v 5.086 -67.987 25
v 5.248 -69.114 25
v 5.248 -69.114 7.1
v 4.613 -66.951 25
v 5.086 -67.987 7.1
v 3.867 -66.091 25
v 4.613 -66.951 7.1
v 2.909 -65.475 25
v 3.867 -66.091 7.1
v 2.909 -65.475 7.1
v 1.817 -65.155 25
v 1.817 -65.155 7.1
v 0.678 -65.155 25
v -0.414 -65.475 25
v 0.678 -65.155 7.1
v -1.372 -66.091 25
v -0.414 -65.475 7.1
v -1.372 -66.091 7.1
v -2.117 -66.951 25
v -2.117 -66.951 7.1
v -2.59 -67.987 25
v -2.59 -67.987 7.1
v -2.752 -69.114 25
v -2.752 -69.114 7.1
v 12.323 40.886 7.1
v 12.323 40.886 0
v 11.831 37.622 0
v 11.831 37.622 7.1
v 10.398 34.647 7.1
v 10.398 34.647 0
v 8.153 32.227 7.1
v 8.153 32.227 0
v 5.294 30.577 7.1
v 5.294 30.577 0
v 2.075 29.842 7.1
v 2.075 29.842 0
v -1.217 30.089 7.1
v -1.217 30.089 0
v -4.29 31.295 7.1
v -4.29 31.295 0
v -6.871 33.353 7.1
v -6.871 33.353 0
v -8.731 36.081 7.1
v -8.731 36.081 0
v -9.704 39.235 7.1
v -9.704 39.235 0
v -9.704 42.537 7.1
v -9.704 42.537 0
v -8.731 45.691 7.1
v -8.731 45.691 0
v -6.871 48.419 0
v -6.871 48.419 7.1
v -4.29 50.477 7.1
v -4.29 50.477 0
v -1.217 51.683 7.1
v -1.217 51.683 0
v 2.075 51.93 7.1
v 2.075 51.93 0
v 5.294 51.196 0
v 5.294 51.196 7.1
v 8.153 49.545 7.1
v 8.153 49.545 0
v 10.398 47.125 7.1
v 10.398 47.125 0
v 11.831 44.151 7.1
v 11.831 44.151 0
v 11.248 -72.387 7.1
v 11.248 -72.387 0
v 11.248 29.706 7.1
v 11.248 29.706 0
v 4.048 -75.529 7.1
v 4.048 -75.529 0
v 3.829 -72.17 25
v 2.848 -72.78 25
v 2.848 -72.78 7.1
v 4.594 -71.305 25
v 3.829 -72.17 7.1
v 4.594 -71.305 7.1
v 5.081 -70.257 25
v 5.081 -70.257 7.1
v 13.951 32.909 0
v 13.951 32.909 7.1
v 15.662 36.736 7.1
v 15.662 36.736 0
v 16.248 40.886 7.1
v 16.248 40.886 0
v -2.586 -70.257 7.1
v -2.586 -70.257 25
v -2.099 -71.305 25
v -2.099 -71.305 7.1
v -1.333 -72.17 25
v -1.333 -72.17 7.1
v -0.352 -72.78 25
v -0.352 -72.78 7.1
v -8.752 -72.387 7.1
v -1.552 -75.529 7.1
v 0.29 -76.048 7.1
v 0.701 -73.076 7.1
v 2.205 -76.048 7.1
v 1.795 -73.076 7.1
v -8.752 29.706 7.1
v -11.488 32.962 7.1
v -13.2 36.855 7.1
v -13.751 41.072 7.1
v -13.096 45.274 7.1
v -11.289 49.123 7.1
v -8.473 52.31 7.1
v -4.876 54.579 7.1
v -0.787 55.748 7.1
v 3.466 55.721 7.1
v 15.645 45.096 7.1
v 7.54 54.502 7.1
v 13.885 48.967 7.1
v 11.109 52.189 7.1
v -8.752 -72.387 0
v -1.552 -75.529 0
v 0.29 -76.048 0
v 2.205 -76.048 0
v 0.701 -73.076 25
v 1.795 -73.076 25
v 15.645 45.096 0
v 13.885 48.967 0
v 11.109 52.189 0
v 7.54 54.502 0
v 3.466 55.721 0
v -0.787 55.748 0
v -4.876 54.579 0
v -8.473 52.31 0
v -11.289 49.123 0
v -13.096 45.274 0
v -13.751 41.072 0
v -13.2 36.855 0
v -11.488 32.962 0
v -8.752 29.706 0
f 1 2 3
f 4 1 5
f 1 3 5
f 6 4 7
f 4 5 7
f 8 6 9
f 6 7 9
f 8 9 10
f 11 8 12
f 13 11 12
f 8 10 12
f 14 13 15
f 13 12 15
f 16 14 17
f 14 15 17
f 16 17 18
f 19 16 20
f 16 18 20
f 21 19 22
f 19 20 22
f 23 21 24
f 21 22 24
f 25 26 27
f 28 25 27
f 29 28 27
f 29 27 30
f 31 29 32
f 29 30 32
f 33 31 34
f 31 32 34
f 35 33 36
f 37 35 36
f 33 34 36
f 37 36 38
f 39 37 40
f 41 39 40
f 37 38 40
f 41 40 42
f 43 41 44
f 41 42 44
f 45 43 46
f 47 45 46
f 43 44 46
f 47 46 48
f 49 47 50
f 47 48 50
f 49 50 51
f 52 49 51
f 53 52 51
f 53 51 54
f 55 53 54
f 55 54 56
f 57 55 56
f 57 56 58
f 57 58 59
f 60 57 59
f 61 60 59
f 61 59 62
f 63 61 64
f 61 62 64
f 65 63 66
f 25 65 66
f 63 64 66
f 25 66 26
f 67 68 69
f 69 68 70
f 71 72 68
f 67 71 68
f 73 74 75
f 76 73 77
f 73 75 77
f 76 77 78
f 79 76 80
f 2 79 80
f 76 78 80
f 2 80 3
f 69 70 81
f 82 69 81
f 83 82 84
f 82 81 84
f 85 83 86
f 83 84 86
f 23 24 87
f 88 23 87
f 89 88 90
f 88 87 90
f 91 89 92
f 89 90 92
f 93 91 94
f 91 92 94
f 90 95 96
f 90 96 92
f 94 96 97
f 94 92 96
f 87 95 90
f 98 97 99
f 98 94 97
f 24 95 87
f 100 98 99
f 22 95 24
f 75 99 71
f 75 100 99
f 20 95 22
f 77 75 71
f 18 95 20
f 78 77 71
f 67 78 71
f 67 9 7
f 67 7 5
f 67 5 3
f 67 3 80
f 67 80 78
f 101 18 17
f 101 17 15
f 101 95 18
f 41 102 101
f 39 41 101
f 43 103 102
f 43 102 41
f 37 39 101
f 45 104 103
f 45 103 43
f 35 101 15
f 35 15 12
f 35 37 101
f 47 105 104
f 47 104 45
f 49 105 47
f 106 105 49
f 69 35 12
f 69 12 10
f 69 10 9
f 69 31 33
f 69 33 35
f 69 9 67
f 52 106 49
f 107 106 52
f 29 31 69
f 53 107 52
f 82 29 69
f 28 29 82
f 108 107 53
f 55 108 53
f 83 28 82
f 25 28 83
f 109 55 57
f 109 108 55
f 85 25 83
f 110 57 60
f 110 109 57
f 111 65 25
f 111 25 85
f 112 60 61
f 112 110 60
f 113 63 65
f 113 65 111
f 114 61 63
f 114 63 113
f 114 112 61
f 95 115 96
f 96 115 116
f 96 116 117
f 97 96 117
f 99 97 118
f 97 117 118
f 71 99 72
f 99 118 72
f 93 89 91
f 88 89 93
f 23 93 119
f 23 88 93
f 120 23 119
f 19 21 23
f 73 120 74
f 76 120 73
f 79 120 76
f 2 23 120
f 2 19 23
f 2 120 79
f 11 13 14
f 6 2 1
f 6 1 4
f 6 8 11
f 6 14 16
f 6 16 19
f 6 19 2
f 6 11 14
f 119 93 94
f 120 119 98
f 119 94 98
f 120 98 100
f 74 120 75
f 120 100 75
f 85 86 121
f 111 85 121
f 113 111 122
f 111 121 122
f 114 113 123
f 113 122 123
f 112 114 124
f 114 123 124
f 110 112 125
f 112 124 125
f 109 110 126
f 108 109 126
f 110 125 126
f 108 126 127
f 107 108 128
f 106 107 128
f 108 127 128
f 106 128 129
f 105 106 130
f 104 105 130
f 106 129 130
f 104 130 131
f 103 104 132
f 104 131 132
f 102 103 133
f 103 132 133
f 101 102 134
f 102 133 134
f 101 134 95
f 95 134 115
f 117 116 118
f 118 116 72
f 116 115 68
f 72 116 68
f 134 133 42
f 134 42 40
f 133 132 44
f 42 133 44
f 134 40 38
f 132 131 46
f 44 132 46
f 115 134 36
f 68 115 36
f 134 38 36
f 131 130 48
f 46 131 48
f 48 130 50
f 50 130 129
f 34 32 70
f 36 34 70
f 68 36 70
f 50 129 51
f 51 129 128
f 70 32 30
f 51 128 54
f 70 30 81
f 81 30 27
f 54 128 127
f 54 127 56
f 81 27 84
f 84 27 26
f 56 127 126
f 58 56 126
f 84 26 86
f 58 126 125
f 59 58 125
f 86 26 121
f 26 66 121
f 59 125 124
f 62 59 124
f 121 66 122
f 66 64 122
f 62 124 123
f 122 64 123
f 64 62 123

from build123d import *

# Parameters (mm, degrees)
F1_DEPTH = 7.1
F2_DEPTH = 25


with BuildPart() as f1:
    # F0 (on Top) → F1 (new body)
    with BuildSketch(Plane.XY):
        with BuildLine():
            Line((-2.752413094, -69.1138580441), (1.247586906, -69.1138580441))
            Line((1.247586906, -69.1138580441), (5.247586906, -69.1138580441))
            ThreePointArc((5.247586906, -69.1138580441), (1.247586906, -65.1138580441), (-2.752413094, -69.1138580441))
        make_face()
        with BuildLine():
            Line((5.247586906, -69.1138580441), (1.247586906, -69.1138580441))
            Line((1.247586906, -69.1138580441), (-2.752413094, -69.1138580441))
            ThreePointArc((-2.752413094, -69.1138580441), (-2.0990532002, -71.3047482742), (-0.352413094, -72.7799186001))
            ThreePointArc((-0.352413094, -72.7799186001), (1.247586906, -73.1138580441), (2.847586906, -72.7799186001))
            ThreePointArc((2.847586906, -72.7799186001), (4.5942270121, -71.3047482742), (5.247586906, -69.1138580441))
        make_face()
        with BuildLine():
            ThreePointArc((-2.752413094, -69.1138580441), (1.247586906, -65.1138580441), (5.247586906, -69.1138580441))
            Line((5.247586906, -69.1138580441), (8.247586906, -69.1138580441))
            ThreePointArc((8.247586906, -69.1138580441), (1.247586906, -62.1138580441), (-5.752413094, -69.1138580441))
            Line((-5.752413094, -69.1138580441), (-2.752413094, -69.1138580441))
        make_face()
        with BuildLine():
            Line((8.247586906, -69.1138580441), (5.247586906, -69.1138580441))
            ThreePointArc((5.247586906, -69.1138580441), (4.5942270121, -71.3047482742), (2.847586906, -72.7799186001))
            Line((2.847586906, -72.7799186001), (8.1125655384, -70.4820935415))
            ThreePointArc((8.1125655384, -70.4820935415), (8.2137497819, -69.8012987954), (8.247586906, -69.1138580441))
        make_face()
        with BuildLine():
            ThreePointArc((-0.352413094, -72.7799186001), (-2.0990532002, -71.3047482742), (-2.752413094, -69.1138580441))
            Line((-2.752413094, -69.1138580441), (-5.752413094, -69.1138580441))
            ThreePointArc((-5.752413094, -69.1138580441), (-5.7185759699, -69.8012987954), (-5.6173917265, -70.4820935415))
            Line((-5.6173917265, -70.4820935415), (-0.352413094, -72.7799186001))
        make_face()
        with BuildLine():
            ThreePointArc((-5.752413094, -69.1138580441), (1.247586906, -62.1138580441), (8.247586906, -69.1138580441))
            Line((8.247586906, -69.1138580441), (11.247586906, -69.1138580441))
            Line((11.247586906, -69.1138580441), (11.247586906, 29.7058020684))
            ThreePointArc((11.247586906, 29.7058020684), (1.247586906, 25.8861419559), (-8.752413094, 29.7058020684))
            Line((-8.752413094, 29.7058020684), (-8.752413094, -69.1138580441))
            Line((-8.752413094, -69.1138580441), (-5.752413094, -69.1138580441))
        make_face()
        with BuildLine():
            Line((11.247586906, -69.1138580441), (8.247586906, -69.1138580441))
            ThreePointArc((8.247586906, -69.1138580441), (8.2137497819, -69.8012987954), (8.1125655384, -70.4820935415))
            Line((8.1125655384, -70.4820935415), (11.247586906, -69.1138580441))
        make_face()
        with BuildLine():
            Line((8.1125655384, -70.4820935415), (2.847586906, -72.7799186001))
            ThreePointArc((2.847586906, -72.7799186001), (1.247586906, -73.1138580441), (-0.352413094, -72.7799186001))
            Line((-0.352413094, -72.7799186001), (-5.6173917265, -70.4820935415))
            ThreePointArc((-5.6173917265, -70.4820935415), (-4.2041963042, -73.5045367877), (-1.552413094, -75.5294640171))
            ThreePointArc((-1.552413094, -75.5294640171), (1.247586906, -76.1138580441), (4.047586906, -75.5294640171))
            ThreePointArc((4.047586906, -75.5294640171), (6.6993701161, -73.5045367877), (8.1125655384, -70.4820935415))
        make_face()
        with BuildLine():
            ThreePointArc((-5.6173917265, -70.4820935415), (-5.7185759699, -69.8012987954), (-5.752413094, -69.1138580441))
            Line((-5.752413094, -69.1138580441), (-8.752413094, -69.1138580441))
            Line((-8.752413094, -69.1138580441), (-5.6173917265, -70.4820935415))
        make_face()
        with BuildLine():
            Line((11.247586906, -72.3871263977), (11.247586906, -69.1138580441))
            Line((11.247586906, -69.1138580441), (8.1125655384, -70.4820935415))
            ThreePointArc((8.1125655384, -70.4820935415), (6.6993701161, -73.5045367877), (4.047586906, -75.5294640171))
            Line((4.047586906, -75.5294640171), (11.247586906, -72.3871263977))
        make_face()
        with BuildLine():
            Line((-5.6173917265, -70.4820935415), (-8.752413094, -69.1138580441))
            Line((-8.752413094, -69.1138580441), (-8.752413094, -72.3871263977))
            Line((-8.752413094, -72.3871263977), (-1.552413094, -75.5294640171))
            ThreePointArc((-1.552413094, -75.5294640171), (-4.2041963042, -73.5045367877), (-5.6173917265, -70.4820935415))
        make_face()
        with BuildLine():
            ThreePointArc((-8.752413094, 29.7058020684), (1.247586906, 25.8861419559), (11.247586906, 29.7058020684))
            Line((11.247586906, 29.7058020684), (11.247586906, 36.1263494184))
            ThreePointArc((11.247586906, 36.1263494184), (1.247586906, 29.8111419559), (-8.752413094, 36.1263494184))
            Line((-8.752413094, 36.1263494184), (-8.752413094, 29.7058020684))
        make_face()
        with BuildLine():
            Line((11.247586906, 36.1263494184), (11.247586906, 29.7058020684))
            ThreePointArc((11.247586906, 29.7058020684), (14.9406508436, 34.7624175989), (16.247586906, 40.8861419559))
            ThreePointArc((16.247586906, 40.8861419559), (-4.876137451, 54.5792058935), (-8.752413094, 29.7058020684))
            Line((-8.752413094, 29.7058020684), (-8.752413094, 36.1263494184))
            ThreePointArc((-8.752413094, 36.1263494184), (-1.1922517158, 51.6890495506), (12.322586906, 40.8861419559))
            ThreePointArc((12.322586906, 40.8861419559), (12.0504945007, 38.4463033341), (11.247586906, 36.1263494184))
        make_face()
    extrude(amount=F1_DEPTH)

    # F0 (on Top) → F2 (join)
    with BuildSketch(Plane.XY):
        with BuildLine():
            Line((-2.752413094, -69.1138580441), (1.247586906, -69.1138580441))
            Line((1.247586906, -69.1138580441), (5.247586906, -69.1138580441))
            ThreePointArc((5.247586906, -69.1138580441), (1.247586906, -65.1138580441), (-2.752413094, -69.1138580441))
        make_face()
        with BuildLine():
            Line((5.247586906, -69.1138580441), (1.247586906, -69.1138580441))
            Line((1.247586906, -69.1138580441), (-2.752413094, -69.1138580441))
            ThreePointArc((-2.752413094, -69.1138580441), (-2.0990532002, -71.3047482742), (-0.352413094, -72.7799186001))
            ThreePointArc((-0.352413094, -72.7799186001), (1.247586906, -73.1138580441), (2.847586906, -72.7799186001))
            ThreePointArc((2.847586906, -72.7799186001), (4.5942270121, -71.3047482742), (5.247586906, -69.1138580441))
        make_face()
    extrude(amount=F2_DEPTH)


solid = f1.part
